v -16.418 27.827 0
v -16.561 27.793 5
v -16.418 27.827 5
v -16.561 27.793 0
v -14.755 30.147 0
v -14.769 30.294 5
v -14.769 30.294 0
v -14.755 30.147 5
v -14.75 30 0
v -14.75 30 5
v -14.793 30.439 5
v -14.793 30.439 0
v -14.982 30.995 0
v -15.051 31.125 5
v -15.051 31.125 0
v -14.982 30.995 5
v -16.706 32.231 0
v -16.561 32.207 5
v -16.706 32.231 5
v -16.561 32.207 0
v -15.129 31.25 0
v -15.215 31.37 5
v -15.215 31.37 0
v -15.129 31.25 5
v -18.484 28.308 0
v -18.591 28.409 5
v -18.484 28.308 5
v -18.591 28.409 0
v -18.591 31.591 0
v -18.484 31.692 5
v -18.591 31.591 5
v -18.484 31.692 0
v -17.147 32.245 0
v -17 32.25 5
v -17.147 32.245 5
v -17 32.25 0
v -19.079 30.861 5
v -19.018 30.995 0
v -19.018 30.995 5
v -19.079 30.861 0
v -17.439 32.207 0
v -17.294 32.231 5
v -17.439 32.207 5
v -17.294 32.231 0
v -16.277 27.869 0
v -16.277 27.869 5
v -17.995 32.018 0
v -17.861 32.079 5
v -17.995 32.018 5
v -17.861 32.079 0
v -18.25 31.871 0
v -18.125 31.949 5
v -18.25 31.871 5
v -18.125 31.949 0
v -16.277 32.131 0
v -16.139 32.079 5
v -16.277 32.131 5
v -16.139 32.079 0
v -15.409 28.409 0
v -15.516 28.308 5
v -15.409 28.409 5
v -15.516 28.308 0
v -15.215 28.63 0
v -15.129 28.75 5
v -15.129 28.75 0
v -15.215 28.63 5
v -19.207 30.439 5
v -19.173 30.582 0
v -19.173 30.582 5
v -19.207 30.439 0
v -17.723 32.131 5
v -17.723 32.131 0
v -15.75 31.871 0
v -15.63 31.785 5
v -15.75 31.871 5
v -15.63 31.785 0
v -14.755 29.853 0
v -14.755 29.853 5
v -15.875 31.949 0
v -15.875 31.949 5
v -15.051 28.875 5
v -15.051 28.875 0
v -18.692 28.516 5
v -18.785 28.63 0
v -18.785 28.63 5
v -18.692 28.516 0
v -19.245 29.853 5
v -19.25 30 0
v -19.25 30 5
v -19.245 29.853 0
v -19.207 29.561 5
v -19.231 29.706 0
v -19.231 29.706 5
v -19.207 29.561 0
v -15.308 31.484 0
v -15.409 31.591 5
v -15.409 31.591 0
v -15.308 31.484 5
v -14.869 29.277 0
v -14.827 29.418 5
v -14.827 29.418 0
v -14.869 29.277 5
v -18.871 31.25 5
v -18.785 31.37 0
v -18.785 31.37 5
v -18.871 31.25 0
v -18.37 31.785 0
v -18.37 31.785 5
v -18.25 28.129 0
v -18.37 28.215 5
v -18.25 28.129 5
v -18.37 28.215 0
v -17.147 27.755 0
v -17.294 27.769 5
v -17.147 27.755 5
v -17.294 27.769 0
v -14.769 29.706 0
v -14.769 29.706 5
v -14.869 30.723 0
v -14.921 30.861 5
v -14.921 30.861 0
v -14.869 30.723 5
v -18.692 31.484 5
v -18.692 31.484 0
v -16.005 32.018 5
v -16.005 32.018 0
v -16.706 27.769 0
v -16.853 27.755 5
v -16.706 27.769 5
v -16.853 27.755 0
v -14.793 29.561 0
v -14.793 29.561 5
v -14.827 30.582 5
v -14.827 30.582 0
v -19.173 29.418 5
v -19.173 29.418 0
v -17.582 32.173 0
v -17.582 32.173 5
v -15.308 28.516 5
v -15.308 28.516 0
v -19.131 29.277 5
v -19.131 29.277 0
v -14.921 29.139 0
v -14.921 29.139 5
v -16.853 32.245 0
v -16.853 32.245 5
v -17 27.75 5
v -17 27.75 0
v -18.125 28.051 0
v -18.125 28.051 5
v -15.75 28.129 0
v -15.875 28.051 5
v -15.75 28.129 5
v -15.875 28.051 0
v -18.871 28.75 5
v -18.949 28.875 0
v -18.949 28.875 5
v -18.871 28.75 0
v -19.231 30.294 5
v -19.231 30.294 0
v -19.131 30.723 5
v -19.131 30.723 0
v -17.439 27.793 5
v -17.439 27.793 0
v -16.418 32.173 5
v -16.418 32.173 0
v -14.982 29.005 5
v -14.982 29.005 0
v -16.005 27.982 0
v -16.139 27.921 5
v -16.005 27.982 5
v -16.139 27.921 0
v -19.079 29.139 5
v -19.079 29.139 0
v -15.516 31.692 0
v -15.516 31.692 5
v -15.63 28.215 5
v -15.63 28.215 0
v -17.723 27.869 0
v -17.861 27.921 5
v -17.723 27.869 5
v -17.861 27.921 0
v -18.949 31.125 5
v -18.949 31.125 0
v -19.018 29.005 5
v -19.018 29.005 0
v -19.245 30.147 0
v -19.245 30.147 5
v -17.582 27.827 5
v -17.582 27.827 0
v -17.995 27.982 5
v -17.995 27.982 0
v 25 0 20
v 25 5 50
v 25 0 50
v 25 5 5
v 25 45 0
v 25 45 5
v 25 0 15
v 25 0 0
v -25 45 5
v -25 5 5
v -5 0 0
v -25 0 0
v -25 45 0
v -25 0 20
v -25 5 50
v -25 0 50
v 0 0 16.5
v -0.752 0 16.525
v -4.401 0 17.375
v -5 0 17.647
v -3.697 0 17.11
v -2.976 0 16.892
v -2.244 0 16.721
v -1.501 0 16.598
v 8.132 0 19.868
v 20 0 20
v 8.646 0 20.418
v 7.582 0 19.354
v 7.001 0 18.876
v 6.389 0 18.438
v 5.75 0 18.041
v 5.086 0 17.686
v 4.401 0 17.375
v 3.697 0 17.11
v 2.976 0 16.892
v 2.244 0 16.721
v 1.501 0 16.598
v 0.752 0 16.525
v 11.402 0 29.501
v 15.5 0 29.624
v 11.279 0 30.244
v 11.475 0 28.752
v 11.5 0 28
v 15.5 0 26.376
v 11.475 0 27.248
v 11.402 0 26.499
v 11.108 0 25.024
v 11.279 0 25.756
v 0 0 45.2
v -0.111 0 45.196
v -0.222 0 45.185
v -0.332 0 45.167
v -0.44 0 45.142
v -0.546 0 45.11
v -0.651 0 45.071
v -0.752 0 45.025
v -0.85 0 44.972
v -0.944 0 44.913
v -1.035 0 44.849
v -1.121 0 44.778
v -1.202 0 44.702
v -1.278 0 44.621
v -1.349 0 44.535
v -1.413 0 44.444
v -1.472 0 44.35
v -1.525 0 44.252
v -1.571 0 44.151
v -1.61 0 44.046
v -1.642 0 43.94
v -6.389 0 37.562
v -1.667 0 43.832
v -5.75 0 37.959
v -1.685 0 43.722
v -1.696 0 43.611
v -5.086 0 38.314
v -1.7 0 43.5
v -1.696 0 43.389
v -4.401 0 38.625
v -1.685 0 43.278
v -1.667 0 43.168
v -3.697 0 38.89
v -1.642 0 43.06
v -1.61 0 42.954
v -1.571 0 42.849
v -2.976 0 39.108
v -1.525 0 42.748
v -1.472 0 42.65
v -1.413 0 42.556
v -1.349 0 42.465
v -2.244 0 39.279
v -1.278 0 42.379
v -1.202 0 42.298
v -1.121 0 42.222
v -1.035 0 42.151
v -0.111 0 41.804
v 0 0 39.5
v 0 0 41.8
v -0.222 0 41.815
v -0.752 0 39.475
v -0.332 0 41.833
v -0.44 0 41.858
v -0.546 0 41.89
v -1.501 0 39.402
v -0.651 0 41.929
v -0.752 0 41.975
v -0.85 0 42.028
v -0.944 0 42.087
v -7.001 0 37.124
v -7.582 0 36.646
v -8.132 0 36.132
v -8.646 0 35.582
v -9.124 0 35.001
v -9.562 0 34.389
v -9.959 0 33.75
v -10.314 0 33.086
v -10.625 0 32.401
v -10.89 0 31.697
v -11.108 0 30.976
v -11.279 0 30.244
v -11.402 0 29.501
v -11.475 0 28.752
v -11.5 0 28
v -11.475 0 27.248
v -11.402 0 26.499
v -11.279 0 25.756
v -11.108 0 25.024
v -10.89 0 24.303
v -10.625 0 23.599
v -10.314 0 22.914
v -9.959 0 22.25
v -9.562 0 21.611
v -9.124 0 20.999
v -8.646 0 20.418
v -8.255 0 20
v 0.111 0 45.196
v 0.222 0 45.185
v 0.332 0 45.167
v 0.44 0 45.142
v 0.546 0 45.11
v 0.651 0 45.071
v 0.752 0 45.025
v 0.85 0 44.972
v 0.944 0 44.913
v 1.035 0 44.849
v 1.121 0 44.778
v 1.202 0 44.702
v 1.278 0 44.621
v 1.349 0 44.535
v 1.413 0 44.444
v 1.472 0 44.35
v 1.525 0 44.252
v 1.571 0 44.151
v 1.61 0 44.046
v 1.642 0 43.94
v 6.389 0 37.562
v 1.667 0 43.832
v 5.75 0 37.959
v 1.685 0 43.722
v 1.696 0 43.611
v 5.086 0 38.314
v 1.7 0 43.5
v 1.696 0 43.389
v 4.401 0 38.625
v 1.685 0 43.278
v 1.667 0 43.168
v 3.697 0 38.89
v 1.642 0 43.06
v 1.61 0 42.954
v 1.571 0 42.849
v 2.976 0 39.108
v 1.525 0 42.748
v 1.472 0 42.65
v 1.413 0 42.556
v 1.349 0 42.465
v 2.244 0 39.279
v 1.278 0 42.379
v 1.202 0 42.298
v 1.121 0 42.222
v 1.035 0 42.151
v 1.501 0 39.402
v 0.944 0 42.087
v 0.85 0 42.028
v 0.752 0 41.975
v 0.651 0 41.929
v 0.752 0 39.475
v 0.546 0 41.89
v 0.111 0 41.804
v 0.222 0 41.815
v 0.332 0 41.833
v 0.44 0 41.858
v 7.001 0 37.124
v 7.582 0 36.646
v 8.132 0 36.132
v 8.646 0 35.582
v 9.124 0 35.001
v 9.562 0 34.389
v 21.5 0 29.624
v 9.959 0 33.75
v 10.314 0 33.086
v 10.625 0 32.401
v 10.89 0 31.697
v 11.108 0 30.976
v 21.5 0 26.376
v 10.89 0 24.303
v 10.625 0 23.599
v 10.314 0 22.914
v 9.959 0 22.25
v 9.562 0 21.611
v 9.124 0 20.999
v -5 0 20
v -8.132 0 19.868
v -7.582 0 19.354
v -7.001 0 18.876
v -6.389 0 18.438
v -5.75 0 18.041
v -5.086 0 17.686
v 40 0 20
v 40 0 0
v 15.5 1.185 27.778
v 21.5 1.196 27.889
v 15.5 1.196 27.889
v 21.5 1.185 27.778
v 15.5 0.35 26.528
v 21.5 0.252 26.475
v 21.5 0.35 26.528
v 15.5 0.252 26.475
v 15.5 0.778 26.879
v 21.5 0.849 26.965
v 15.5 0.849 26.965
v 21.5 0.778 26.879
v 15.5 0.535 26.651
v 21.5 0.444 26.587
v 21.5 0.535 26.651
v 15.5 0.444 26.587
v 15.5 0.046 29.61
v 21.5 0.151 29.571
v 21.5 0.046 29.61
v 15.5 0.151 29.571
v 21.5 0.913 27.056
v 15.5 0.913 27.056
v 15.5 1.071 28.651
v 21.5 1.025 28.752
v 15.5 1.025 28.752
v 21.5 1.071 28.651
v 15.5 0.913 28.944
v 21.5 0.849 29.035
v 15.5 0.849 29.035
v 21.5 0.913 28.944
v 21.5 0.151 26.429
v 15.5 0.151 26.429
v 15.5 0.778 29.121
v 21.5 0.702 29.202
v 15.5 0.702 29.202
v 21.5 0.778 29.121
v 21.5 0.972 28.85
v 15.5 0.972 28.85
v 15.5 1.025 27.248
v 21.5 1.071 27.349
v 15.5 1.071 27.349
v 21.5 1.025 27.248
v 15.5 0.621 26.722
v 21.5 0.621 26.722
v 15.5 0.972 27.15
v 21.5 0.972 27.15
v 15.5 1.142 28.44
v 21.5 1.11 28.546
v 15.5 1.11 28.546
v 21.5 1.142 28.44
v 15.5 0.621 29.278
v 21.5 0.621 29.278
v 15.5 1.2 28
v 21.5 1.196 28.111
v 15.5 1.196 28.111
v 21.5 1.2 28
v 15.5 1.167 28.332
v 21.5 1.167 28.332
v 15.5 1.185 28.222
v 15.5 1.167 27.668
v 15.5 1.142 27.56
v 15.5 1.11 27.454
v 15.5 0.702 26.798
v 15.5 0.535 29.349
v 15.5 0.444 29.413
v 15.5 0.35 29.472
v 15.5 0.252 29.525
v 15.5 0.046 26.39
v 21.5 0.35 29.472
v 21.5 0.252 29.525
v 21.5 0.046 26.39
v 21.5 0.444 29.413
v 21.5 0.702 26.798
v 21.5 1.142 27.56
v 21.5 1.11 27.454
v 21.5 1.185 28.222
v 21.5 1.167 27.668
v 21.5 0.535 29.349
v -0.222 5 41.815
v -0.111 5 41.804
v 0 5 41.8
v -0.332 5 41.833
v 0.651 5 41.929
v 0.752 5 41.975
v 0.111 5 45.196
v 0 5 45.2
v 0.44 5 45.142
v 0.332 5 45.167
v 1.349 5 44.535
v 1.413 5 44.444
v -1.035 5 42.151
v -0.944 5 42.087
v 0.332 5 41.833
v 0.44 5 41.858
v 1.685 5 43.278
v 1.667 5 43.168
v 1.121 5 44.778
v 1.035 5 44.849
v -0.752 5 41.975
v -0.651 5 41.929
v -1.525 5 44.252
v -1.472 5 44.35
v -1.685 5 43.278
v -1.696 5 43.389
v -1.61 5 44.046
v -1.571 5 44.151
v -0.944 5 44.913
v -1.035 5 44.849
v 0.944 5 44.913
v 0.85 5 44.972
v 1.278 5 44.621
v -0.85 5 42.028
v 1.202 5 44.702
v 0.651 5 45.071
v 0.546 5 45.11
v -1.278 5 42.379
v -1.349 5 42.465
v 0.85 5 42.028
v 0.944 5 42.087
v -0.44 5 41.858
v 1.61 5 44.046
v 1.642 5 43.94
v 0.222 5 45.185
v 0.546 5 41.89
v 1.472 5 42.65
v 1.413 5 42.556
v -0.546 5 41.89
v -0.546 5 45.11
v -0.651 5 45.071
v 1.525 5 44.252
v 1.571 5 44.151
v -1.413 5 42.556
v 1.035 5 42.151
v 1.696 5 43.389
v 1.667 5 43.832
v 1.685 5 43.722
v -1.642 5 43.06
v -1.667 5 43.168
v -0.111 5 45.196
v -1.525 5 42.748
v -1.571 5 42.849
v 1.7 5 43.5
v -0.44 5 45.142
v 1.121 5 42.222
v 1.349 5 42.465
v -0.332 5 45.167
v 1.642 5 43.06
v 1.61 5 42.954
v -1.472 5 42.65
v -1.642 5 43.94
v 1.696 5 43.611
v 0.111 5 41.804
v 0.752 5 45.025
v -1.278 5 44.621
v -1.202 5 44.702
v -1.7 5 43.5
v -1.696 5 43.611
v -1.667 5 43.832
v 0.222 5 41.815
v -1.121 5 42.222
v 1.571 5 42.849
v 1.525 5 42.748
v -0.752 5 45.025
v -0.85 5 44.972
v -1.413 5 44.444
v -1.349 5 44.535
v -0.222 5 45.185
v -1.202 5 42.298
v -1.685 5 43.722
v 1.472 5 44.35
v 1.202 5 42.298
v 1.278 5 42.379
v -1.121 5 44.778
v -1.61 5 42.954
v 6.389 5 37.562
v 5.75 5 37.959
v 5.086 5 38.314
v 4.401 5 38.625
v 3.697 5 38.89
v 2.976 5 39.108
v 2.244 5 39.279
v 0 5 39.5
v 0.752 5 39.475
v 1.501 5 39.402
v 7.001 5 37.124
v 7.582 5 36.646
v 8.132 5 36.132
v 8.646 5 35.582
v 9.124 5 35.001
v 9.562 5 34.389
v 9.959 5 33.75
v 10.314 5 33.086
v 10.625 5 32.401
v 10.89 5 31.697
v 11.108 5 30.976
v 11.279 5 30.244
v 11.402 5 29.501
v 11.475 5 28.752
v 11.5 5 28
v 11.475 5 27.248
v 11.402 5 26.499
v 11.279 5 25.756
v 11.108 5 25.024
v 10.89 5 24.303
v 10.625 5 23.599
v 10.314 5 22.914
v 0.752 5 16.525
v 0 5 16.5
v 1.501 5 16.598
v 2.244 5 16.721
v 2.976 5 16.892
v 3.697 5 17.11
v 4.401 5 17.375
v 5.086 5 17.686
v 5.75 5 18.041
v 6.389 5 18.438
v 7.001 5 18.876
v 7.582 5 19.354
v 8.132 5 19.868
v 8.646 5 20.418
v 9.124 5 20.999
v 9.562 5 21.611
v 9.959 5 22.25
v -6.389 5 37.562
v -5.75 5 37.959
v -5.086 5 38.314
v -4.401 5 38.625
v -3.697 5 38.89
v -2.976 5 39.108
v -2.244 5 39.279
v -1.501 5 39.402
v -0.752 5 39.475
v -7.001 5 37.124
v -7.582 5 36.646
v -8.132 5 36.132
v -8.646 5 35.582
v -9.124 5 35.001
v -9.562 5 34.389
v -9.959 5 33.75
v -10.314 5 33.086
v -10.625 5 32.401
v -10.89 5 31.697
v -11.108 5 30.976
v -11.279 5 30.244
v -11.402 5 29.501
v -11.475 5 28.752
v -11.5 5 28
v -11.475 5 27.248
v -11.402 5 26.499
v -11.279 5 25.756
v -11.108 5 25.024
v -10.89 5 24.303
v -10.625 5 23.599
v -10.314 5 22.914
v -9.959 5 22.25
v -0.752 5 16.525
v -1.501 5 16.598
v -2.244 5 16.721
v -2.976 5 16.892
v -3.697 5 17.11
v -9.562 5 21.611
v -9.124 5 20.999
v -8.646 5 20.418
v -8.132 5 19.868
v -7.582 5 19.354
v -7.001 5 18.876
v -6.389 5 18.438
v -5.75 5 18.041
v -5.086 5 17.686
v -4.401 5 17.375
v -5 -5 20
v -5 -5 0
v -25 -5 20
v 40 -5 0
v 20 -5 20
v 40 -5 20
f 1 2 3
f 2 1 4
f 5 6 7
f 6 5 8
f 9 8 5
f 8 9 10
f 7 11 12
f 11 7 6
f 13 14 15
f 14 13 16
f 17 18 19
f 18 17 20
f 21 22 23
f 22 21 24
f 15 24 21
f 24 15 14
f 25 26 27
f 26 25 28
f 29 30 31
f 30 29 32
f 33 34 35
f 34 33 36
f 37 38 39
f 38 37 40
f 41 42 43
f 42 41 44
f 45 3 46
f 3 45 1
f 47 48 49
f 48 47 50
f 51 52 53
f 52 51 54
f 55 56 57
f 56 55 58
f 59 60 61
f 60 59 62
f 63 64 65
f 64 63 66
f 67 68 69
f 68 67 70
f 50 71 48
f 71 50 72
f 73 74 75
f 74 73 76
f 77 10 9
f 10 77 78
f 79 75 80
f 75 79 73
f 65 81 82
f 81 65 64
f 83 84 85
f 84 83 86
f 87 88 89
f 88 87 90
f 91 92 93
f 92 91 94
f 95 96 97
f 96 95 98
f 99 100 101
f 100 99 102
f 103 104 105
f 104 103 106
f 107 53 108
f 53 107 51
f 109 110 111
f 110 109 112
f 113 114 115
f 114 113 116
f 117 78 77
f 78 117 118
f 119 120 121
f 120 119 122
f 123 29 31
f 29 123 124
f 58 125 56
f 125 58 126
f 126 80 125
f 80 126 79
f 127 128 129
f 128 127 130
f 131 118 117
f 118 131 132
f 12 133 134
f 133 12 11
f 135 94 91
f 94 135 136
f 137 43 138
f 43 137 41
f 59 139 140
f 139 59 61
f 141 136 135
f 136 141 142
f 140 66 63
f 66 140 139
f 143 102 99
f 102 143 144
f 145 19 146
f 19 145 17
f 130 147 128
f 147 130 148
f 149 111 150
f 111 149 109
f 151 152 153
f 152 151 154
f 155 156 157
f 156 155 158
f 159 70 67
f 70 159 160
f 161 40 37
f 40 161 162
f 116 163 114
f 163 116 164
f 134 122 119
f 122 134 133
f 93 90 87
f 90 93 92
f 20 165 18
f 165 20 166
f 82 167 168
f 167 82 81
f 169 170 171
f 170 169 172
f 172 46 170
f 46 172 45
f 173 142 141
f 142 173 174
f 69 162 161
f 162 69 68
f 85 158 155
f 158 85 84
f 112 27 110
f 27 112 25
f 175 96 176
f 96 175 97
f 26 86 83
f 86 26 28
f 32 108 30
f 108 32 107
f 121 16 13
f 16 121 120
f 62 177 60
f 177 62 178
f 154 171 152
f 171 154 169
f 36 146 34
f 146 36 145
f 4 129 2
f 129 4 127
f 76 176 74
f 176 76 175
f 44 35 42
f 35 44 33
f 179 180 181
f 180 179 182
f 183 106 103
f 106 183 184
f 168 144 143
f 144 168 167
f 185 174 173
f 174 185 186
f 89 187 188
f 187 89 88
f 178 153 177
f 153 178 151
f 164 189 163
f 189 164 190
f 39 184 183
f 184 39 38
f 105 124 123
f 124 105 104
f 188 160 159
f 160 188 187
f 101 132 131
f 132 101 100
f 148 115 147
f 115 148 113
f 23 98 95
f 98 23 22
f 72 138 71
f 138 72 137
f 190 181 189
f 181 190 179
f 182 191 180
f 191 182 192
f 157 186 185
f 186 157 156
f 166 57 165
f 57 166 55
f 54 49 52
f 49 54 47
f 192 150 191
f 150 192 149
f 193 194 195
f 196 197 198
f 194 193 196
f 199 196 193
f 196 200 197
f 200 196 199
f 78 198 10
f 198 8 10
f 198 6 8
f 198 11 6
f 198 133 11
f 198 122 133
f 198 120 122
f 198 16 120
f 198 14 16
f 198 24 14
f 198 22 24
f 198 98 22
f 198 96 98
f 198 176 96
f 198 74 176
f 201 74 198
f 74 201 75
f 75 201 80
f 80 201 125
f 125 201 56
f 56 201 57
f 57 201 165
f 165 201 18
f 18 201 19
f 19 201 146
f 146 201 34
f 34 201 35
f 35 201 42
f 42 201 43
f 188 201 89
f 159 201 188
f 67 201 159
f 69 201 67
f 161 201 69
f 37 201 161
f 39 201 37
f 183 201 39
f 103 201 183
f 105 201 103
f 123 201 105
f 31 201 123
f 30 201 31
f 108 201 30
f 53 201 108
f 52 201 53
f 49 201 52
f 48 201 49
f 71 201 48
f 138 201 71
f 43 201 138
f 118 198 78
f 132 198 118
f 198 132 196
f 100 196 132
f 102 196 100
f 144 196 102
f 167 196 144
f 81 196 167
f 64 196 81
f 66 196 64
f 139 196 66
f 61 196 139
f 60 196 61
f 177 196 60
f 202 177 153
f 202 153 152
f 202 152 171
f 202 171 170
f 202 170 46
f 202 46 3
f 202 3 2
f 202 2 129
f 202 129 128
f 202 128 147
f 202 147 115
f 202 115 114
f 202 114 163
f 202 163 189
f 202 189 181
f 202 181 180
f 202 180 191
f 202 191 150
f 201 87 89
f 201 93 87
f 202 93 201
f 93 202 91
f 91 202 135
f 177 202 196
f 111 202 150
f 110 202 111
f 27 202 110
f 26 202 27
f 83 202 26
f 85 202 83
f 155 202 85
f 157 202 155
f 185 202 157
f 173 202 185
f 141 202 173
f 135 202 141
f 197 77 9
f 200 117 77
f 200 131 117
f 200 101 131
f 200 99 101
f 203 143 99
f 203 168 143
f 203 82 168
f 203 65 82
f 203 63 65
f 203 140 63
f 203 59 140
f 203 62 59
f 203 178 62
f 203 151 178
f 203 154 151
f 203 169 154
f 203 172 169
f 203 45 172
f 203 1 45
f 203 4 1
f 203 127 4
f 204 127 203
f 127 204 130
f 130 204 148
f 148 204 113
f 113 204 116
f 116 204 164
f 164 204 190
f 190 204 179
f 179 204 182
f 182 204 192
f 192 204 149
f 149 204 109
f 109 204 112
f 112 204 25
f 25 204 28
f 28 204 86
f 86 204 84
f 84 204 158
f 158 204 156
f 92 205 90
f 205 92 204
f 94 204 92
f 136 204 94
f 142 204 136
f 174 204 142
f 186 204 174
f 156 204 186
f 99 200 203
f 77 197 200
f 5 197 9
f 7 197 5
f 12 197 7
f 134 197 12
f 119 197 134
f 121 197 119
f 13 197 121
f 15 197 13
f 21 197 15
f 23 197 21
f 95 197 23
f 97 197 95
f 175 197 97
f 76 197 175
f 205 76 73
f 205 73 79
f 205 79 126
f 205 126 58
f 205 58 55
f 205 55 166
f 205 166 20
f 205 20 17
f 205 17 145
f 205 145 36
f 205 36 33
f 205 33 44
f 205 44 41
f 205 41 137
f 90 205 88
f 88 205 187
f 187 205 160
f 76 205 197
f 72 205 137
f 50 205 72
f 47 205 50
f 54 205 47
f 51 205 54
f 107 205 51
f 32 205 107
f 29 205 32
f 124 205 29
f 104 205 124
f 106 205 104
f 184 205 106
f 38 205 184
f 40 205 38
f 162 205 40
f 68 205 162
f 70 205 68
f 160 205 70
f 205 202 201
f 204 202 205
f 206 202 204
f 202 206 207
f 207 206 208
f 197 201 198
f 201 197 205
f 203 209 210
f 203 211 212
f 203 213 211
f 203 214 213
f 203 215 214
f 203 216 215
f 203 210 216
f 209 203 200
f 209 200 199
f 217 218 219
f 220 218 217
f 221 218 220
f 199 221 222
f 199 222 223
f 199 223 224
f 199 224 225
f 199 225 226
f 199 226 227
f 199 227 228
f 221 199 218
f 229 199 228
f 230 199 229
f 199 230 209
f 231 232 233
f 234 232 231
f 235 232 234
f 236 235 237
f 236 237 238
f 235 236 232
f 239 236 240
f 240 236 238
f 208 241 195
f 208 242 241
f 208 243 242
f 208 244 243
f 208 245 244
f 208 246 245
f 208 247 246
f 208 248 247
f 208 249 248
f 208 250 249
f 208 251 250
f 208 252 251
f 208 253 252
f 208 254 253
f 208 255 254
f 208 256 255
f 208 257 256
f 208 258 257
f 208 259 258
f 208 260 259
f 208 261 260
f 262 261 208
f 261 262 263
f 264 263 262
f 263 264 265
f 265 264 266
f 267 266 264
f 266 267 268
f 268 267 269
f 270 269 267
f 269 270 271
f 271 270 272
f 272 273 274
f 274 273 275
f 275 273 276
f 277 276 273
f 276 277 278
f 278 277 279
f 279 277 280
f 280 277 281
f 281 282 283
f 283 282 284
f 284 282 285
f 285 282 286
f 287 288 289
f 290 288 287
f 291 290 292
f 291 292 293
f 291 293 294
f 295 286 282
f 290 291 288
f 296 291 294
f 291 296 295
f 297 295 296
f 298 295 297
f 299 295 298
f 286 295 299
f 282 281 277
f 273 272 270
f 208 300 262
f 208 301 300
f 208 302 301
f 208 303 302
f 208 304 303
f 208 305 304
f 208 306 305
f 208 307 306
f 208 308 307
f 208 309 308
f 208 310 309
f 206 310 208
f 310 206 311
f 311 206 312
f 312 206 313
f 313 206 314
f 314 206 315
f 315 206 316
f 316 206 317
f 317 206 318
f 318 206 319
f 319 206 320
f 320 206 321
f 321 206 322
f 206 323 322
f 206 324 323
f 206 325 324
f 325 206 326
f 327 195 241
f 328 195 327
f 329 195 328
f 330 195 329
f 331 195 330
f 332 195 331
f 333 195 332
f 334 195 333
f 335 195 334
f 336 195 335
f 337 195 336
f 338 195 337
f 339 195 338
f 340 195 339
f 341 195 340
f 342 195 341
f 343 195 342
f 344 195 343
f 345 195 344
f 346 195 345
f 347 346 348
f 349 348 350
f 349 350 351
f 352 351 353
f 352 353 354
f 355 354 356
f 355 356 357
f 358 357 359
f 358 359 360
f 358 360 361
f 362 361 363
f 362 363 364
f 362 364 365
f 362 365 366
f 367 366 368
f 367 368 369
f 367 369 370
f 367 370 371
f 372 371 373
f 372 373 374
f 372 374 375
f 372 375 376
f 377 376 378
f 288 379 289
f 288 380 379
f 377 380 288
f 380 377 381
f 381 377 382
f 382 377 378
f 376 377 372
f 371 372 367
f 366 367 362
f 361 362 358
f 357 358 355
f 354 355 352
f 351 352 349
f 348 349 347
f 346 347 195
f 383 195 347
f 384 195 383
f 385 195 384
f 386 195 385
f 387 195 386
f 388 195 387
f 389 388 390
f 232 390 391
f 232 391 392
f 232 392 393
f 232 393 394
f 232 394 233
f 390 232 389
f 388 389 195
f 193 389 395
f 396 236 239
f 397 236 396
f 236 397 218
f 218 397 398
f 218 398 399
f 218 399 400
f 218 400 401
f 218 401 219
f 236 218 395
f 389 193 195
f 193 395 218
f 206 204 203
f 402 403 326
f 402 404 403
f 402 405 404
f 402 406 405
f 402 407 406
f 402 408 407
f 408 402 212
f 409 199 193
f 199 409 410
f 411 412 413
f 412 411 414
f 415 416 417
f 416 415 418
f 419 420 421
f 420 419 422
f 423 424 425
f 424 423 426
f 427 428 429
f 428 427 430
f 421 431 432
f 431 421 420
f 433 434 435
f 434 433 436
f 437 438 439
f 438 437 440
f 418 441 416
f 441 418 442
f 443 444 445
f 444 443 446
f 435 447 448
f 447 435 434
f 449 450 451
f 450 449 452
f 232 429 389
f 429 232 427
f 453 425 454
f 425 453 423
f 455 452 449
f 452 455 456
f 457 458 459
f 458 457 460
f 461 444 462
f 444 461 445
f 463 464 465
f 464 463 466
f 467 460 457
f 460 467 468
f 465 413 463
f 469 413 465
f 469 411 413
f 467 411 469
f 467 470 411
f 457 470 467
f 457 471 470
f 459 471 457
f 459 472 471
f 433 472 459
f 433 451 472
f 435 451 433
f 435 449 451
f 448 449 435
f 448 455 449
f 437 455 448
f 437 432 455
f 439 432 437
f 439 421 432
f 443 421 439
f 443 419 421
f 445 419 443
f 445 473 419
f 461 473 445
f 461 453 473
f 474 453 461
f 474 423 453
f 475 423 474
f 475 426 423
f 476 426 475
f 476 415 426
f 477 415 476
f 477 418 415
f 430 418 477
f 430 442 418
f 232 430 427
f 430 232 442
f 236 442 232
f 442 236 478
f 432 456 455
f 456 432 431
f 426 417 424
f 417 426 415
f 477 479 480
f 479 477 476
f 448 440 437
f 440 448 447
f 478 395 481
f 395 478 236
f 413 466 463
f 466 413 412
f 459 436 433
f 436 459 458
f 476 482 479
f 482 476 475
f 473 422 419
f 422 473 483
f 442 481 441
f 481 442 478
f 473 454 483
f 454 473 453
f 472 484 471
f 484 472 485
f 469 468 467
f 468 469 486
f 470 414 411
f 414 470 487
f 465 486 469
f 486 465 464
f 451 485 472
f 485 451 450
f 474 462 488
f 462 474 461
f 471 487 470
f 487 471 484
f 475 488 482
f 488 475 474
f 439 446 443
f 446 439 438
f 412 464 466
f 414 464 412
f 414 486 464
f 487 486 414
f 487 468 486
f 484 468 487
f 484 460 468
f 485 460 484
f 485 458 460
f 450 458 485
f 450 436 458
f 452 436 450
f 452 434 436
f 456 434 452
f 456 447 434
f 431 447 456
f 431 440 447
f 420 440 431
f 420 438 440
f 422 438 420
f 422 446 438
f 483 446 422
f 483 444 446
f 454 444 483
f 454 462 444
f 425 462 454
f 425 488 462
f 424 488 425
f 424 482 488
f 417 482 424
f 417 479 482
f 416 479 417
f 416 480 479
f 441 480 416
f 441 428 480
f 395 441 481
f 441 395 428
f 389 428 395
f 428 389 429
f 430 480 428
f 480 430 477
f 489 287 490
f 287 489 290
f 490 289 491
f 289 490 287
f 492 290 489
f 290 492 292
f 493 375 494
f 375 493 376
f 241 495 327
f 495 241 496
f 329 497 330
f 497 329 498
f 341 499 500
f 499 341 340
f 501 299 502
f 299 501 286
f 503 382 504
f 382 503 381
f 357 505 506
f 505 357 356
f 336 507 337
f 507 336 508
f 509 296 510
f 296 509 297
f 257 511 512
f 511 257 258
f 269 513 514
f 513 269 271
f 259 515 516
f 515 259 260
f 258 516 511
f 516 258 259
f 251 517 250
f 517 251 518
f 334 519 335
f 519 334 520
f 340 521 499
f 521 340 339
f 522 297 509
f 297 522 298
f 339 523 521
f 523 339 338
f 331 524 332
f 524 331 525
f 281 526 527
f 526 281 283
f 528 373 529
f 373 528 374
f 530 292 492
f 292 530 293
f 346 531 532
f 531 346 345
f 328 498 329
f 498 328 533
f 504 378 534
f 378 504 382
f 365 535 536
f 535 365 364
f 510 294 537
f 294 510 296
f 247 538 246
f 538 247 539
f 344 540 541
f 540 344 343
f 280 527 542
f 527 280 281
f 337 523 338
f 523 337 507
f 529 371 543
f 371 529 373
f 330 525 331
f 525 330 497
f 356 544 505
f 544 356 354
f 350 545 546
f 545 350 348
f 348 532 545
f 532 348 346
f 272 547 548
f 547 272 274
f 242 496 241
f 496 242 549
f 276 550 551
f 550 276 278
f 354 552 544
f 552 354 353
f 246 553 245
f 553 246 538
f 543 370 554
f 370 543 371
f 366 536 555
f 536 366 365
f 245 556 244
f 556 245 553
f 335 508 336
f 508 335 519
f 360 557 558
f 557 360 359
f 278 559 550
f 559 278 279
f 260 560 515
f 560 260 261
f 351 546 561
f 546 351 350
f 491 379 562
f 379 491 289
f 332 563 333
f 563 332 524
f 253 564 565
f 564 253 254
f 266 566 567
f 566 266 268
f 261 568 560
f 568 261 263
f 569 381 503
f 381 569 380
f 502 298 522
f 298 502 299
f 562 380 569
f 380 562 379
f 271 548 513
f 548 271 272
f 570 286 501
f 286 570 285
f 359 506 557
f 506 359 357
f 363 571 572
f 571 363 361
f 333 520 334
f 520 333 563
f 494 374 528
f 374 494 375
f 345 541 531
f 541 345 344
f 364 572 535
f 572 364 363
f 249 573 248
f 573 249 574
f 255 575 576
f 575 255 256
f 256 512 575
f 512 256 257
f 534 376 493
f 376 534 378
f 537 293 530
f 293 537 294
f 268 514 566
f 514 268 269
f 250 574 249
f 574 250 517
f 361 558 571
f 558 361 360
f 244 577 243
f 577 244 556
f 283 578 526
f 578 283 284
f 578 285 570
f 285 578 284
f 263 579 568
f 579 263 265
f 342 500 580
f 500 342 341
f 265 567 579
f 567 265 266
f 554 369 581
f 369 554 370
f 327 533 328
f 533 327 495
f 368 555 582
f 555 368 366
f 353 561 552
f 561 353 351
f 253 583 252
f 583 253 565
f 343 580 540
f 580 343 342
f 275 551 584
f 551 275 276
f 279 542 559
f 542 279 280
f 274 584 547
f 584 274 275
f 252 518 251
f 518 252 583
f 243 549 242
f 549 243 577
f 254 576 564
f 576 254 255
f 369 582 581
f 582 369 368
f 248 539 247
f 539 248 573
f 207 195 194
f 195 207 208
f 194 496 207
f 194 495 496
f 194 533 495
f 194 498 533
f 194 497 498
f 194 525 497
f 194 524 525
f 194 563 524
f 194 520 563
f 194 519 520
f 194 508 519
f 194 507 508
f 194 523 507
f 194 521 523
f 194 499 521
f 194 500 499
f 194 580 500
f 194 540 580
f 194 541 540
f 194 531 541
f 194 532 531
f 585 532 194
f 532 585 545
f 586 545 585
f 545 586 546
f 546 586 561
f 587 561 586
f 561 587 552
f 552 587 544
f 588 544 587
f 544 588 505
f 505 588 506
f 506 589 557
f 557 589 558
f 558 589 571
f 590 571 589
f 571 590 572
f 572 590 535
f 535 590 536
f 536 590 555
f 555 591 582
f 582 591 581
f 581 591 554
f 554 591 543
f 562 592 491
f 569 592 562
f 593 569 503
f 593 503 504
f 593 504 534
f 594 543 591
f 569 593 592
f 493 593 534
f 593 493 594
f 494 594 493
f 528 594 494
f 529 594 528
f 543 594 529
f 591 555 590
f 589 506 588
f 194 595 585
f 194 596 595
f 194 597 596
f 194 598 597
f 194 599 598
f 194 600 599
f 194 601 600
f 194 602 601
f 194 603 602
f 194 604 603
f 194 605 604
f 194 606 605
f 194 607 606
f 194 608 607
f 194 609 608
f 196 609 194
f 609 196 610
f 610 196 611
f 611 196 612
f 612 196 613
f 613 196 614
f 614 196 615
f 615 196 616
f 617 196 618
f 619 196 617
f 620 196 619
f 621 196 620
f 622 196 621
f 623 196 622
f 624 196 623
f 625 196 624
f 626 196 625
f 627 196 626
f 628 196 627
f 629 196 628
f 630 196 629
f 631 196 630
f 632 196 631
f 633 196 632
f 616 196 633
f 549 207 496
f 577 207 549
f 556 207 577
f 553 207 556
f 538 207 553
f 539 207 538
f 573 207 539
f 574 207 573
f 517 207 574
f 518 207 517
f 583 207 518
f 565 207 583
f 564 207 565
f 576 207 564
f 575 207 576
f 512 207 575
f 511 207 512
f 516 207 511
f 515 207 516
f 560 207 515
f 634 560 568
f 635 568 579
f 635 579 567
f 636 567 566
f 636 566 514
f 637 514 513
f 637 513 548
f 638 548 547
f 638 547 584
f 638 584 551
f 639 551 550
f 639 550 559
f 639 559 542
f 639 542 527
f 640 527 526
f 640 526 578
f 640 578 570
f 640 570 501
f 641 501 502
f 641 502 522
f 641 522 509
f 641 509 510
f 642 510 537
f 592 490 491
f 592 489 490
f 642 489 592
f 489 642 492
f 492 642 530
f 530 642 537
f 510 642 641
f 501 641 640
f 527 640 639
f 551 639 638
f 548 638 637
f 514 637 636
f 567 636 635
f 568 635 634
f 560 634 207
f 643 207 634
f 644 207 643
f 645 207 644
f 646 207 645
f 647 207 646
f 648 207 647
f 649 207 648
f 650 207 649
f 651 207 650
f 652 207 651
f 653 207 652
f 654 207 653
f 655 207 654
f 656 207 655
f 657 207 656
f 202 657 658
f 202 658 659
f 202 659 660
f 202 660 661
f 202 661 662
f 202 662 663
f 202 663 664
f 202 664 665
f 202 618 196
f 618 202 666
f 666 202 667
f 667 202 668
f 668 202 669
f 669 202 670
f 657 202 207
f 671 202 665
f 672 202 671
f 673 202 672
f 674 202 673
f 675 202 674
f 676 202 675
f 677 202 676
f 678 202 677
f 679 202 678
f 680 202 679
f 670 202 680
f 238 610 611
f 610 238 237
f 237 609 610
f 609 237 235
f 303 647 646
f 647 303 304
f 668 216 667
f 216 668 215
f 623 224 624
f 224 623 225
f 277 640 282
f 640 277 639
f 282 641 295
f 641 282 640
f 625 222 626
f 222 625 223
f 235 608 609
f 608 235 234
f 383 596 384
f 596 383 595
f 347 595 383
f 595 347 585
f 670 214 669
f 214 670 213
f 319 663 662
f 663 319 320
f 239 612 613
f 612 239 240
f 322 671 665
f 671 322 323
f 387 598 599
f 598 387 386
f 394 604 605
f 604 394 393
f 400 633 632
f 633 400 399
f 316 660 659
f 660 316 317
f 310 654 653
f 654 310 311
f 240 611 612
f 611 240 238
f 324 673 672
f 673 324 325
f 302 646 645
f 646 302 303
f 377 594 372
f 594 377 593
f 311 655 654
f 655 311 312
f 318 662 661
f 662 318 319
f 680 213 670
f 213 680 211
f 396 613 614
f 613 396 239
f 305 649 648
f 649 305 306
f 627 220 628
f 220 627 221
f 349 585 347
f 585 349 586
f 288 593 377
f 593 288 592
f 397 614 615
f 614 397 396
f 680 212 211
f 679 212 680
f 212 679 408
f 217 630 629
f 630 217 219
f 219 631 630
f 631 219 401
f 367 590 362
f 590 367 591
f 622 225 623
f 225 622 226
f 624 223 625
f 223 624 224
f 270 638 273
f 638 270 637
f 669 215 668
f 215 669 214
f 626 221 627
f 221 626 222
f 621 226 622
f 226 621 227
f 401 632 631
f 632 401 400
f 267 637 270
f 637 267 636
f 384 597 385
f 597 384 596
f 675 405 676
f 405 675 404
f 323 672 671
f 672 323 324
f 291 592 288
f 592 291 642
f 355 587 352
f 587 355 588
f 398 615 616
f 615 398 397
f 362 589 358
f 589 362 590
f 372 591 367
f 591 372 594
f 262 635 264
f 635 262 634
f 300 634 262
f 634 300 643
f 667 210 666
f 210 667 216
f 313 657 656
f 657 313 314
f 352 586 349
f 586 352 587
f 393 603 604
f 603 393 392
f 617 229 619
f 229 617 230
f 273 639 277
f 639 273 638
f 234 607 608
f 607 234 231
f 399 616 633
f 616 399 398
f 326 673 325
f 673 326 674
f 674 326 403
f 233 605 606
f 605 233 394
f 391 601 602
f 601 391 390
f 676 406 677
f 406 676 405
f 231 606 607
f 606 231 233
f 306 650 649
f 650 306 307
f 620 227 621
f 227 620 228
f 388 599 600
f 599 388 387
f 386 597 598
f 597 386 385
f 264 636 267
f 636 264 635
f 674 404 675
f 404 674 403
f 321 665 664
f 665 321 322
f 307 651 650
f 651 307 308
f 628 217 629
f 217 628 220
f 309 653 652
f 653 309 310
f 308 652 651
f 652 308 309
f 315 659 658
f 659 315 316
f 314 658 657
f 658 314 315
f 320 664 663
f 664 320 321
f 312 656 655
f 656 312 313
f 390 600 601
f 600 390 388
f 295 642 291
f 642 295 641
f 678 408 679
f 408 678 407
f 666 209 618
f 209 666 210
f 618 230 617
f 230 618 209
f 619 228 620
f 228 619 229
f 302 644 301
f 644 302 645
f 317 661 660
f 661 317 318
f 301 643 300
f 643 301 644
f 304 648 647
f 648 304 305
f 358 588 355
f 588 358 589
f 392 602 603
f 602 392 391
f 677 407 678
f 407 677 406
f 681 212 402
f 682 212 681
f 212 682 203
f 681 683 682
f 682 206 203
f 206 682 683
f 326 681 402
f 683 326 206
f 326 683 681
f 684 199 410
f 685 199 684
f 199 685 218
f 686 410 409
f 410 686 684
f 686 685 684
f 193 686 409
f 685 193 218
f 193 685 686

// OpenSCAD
// L-shaped mounting bracket for NEMA 17 stepper motor
// Print orientation: base plate on bed (z = 0), vertical plate builds upward (+Z)

// ---------------- Parameters ----------------
plate_x       = 25;    // base plate half-width (X)
plate_y       = 45;    // base plate length (Y)
plate_t       = 5;     // base plate thickness (Z)

motor_h       = 50;    // vertical motor plate height (Z)
motor_w       = 5;     // vertical motor plate thickness (Y)

boss_d        = 23;    // motor centring boss hole diameter
boss_x        = 0;     // boss hole centre X
boss_z        = 28;    // boss hole centre Z

screw_d       = 3.4;   // M3 screw hole diameter
screw_pattern = 31;    // square pitch of screw holes
screw_count   = 4;     // number of screw holes

gusset_t      = 5;     // gusset thickness (X)
gusset_leg    = 20;    // right-triangle leg length (Y and Z)
gusset_x      = [-25, 20]; // gusset start X positions

eps           = 0.5;   // cutter overshoot past faces
$fn           = 96;    // curve resolution

// ---------------- Model ----------------
union() {
    // Base plate with M4 through-holes
    difference() {
        translate([-plate_x, 0, 0])
            cube([plate_x * 2, plate_y, plate_t]);

        for (h = [0, 1])
            translate([-17, 30, h * plate_t - eps])
                cylinder(d = 4.5, h = plate_t + 2 * eps);
    }

    // Vertical motor plate with boss hole and M3 screw holes
    difference() {
        translate([-plate_x, 0, 0])
            cube([plate_x * 2, motor_w, motor_h]);

        // Boss hole along Y
        translate([boss_x, -eps, boss_z])
            rotate([-90, 0, 0])
                cylinder(d = boss_d, h = motor_w + 2 * eps);

        // Screw holes on square pattern centred on boss hole
        for (i = [0 : screw_count - 1]) {
            a = (i < 2) ? 0 : 90;   // 0 deg: X axis, 90 deg: Z axis
            r = screw_pattern / 2;
            translate([boss_x + r * cos(a), -eps, boss_z + r * sin(a)])
                rotate([0, 90, a])
                    cylinder(d = screw_d, h = motor_w + 2 * eps);
        }
    }

    // Triangular gussets flush with left and right edges
    for (gx = gusset_x)
        translate([gx, 0, 0])
            rotate([90, 0, 0])
                linear_extrude(height = gusset_t)
                    polygon(points = [
                        [gusset_leg, gusset_leg],   // right-angle corner at y=5, z=5
                        [gusset_leg, 0],
                        [0, gusset_leg]
                    ]);
}
